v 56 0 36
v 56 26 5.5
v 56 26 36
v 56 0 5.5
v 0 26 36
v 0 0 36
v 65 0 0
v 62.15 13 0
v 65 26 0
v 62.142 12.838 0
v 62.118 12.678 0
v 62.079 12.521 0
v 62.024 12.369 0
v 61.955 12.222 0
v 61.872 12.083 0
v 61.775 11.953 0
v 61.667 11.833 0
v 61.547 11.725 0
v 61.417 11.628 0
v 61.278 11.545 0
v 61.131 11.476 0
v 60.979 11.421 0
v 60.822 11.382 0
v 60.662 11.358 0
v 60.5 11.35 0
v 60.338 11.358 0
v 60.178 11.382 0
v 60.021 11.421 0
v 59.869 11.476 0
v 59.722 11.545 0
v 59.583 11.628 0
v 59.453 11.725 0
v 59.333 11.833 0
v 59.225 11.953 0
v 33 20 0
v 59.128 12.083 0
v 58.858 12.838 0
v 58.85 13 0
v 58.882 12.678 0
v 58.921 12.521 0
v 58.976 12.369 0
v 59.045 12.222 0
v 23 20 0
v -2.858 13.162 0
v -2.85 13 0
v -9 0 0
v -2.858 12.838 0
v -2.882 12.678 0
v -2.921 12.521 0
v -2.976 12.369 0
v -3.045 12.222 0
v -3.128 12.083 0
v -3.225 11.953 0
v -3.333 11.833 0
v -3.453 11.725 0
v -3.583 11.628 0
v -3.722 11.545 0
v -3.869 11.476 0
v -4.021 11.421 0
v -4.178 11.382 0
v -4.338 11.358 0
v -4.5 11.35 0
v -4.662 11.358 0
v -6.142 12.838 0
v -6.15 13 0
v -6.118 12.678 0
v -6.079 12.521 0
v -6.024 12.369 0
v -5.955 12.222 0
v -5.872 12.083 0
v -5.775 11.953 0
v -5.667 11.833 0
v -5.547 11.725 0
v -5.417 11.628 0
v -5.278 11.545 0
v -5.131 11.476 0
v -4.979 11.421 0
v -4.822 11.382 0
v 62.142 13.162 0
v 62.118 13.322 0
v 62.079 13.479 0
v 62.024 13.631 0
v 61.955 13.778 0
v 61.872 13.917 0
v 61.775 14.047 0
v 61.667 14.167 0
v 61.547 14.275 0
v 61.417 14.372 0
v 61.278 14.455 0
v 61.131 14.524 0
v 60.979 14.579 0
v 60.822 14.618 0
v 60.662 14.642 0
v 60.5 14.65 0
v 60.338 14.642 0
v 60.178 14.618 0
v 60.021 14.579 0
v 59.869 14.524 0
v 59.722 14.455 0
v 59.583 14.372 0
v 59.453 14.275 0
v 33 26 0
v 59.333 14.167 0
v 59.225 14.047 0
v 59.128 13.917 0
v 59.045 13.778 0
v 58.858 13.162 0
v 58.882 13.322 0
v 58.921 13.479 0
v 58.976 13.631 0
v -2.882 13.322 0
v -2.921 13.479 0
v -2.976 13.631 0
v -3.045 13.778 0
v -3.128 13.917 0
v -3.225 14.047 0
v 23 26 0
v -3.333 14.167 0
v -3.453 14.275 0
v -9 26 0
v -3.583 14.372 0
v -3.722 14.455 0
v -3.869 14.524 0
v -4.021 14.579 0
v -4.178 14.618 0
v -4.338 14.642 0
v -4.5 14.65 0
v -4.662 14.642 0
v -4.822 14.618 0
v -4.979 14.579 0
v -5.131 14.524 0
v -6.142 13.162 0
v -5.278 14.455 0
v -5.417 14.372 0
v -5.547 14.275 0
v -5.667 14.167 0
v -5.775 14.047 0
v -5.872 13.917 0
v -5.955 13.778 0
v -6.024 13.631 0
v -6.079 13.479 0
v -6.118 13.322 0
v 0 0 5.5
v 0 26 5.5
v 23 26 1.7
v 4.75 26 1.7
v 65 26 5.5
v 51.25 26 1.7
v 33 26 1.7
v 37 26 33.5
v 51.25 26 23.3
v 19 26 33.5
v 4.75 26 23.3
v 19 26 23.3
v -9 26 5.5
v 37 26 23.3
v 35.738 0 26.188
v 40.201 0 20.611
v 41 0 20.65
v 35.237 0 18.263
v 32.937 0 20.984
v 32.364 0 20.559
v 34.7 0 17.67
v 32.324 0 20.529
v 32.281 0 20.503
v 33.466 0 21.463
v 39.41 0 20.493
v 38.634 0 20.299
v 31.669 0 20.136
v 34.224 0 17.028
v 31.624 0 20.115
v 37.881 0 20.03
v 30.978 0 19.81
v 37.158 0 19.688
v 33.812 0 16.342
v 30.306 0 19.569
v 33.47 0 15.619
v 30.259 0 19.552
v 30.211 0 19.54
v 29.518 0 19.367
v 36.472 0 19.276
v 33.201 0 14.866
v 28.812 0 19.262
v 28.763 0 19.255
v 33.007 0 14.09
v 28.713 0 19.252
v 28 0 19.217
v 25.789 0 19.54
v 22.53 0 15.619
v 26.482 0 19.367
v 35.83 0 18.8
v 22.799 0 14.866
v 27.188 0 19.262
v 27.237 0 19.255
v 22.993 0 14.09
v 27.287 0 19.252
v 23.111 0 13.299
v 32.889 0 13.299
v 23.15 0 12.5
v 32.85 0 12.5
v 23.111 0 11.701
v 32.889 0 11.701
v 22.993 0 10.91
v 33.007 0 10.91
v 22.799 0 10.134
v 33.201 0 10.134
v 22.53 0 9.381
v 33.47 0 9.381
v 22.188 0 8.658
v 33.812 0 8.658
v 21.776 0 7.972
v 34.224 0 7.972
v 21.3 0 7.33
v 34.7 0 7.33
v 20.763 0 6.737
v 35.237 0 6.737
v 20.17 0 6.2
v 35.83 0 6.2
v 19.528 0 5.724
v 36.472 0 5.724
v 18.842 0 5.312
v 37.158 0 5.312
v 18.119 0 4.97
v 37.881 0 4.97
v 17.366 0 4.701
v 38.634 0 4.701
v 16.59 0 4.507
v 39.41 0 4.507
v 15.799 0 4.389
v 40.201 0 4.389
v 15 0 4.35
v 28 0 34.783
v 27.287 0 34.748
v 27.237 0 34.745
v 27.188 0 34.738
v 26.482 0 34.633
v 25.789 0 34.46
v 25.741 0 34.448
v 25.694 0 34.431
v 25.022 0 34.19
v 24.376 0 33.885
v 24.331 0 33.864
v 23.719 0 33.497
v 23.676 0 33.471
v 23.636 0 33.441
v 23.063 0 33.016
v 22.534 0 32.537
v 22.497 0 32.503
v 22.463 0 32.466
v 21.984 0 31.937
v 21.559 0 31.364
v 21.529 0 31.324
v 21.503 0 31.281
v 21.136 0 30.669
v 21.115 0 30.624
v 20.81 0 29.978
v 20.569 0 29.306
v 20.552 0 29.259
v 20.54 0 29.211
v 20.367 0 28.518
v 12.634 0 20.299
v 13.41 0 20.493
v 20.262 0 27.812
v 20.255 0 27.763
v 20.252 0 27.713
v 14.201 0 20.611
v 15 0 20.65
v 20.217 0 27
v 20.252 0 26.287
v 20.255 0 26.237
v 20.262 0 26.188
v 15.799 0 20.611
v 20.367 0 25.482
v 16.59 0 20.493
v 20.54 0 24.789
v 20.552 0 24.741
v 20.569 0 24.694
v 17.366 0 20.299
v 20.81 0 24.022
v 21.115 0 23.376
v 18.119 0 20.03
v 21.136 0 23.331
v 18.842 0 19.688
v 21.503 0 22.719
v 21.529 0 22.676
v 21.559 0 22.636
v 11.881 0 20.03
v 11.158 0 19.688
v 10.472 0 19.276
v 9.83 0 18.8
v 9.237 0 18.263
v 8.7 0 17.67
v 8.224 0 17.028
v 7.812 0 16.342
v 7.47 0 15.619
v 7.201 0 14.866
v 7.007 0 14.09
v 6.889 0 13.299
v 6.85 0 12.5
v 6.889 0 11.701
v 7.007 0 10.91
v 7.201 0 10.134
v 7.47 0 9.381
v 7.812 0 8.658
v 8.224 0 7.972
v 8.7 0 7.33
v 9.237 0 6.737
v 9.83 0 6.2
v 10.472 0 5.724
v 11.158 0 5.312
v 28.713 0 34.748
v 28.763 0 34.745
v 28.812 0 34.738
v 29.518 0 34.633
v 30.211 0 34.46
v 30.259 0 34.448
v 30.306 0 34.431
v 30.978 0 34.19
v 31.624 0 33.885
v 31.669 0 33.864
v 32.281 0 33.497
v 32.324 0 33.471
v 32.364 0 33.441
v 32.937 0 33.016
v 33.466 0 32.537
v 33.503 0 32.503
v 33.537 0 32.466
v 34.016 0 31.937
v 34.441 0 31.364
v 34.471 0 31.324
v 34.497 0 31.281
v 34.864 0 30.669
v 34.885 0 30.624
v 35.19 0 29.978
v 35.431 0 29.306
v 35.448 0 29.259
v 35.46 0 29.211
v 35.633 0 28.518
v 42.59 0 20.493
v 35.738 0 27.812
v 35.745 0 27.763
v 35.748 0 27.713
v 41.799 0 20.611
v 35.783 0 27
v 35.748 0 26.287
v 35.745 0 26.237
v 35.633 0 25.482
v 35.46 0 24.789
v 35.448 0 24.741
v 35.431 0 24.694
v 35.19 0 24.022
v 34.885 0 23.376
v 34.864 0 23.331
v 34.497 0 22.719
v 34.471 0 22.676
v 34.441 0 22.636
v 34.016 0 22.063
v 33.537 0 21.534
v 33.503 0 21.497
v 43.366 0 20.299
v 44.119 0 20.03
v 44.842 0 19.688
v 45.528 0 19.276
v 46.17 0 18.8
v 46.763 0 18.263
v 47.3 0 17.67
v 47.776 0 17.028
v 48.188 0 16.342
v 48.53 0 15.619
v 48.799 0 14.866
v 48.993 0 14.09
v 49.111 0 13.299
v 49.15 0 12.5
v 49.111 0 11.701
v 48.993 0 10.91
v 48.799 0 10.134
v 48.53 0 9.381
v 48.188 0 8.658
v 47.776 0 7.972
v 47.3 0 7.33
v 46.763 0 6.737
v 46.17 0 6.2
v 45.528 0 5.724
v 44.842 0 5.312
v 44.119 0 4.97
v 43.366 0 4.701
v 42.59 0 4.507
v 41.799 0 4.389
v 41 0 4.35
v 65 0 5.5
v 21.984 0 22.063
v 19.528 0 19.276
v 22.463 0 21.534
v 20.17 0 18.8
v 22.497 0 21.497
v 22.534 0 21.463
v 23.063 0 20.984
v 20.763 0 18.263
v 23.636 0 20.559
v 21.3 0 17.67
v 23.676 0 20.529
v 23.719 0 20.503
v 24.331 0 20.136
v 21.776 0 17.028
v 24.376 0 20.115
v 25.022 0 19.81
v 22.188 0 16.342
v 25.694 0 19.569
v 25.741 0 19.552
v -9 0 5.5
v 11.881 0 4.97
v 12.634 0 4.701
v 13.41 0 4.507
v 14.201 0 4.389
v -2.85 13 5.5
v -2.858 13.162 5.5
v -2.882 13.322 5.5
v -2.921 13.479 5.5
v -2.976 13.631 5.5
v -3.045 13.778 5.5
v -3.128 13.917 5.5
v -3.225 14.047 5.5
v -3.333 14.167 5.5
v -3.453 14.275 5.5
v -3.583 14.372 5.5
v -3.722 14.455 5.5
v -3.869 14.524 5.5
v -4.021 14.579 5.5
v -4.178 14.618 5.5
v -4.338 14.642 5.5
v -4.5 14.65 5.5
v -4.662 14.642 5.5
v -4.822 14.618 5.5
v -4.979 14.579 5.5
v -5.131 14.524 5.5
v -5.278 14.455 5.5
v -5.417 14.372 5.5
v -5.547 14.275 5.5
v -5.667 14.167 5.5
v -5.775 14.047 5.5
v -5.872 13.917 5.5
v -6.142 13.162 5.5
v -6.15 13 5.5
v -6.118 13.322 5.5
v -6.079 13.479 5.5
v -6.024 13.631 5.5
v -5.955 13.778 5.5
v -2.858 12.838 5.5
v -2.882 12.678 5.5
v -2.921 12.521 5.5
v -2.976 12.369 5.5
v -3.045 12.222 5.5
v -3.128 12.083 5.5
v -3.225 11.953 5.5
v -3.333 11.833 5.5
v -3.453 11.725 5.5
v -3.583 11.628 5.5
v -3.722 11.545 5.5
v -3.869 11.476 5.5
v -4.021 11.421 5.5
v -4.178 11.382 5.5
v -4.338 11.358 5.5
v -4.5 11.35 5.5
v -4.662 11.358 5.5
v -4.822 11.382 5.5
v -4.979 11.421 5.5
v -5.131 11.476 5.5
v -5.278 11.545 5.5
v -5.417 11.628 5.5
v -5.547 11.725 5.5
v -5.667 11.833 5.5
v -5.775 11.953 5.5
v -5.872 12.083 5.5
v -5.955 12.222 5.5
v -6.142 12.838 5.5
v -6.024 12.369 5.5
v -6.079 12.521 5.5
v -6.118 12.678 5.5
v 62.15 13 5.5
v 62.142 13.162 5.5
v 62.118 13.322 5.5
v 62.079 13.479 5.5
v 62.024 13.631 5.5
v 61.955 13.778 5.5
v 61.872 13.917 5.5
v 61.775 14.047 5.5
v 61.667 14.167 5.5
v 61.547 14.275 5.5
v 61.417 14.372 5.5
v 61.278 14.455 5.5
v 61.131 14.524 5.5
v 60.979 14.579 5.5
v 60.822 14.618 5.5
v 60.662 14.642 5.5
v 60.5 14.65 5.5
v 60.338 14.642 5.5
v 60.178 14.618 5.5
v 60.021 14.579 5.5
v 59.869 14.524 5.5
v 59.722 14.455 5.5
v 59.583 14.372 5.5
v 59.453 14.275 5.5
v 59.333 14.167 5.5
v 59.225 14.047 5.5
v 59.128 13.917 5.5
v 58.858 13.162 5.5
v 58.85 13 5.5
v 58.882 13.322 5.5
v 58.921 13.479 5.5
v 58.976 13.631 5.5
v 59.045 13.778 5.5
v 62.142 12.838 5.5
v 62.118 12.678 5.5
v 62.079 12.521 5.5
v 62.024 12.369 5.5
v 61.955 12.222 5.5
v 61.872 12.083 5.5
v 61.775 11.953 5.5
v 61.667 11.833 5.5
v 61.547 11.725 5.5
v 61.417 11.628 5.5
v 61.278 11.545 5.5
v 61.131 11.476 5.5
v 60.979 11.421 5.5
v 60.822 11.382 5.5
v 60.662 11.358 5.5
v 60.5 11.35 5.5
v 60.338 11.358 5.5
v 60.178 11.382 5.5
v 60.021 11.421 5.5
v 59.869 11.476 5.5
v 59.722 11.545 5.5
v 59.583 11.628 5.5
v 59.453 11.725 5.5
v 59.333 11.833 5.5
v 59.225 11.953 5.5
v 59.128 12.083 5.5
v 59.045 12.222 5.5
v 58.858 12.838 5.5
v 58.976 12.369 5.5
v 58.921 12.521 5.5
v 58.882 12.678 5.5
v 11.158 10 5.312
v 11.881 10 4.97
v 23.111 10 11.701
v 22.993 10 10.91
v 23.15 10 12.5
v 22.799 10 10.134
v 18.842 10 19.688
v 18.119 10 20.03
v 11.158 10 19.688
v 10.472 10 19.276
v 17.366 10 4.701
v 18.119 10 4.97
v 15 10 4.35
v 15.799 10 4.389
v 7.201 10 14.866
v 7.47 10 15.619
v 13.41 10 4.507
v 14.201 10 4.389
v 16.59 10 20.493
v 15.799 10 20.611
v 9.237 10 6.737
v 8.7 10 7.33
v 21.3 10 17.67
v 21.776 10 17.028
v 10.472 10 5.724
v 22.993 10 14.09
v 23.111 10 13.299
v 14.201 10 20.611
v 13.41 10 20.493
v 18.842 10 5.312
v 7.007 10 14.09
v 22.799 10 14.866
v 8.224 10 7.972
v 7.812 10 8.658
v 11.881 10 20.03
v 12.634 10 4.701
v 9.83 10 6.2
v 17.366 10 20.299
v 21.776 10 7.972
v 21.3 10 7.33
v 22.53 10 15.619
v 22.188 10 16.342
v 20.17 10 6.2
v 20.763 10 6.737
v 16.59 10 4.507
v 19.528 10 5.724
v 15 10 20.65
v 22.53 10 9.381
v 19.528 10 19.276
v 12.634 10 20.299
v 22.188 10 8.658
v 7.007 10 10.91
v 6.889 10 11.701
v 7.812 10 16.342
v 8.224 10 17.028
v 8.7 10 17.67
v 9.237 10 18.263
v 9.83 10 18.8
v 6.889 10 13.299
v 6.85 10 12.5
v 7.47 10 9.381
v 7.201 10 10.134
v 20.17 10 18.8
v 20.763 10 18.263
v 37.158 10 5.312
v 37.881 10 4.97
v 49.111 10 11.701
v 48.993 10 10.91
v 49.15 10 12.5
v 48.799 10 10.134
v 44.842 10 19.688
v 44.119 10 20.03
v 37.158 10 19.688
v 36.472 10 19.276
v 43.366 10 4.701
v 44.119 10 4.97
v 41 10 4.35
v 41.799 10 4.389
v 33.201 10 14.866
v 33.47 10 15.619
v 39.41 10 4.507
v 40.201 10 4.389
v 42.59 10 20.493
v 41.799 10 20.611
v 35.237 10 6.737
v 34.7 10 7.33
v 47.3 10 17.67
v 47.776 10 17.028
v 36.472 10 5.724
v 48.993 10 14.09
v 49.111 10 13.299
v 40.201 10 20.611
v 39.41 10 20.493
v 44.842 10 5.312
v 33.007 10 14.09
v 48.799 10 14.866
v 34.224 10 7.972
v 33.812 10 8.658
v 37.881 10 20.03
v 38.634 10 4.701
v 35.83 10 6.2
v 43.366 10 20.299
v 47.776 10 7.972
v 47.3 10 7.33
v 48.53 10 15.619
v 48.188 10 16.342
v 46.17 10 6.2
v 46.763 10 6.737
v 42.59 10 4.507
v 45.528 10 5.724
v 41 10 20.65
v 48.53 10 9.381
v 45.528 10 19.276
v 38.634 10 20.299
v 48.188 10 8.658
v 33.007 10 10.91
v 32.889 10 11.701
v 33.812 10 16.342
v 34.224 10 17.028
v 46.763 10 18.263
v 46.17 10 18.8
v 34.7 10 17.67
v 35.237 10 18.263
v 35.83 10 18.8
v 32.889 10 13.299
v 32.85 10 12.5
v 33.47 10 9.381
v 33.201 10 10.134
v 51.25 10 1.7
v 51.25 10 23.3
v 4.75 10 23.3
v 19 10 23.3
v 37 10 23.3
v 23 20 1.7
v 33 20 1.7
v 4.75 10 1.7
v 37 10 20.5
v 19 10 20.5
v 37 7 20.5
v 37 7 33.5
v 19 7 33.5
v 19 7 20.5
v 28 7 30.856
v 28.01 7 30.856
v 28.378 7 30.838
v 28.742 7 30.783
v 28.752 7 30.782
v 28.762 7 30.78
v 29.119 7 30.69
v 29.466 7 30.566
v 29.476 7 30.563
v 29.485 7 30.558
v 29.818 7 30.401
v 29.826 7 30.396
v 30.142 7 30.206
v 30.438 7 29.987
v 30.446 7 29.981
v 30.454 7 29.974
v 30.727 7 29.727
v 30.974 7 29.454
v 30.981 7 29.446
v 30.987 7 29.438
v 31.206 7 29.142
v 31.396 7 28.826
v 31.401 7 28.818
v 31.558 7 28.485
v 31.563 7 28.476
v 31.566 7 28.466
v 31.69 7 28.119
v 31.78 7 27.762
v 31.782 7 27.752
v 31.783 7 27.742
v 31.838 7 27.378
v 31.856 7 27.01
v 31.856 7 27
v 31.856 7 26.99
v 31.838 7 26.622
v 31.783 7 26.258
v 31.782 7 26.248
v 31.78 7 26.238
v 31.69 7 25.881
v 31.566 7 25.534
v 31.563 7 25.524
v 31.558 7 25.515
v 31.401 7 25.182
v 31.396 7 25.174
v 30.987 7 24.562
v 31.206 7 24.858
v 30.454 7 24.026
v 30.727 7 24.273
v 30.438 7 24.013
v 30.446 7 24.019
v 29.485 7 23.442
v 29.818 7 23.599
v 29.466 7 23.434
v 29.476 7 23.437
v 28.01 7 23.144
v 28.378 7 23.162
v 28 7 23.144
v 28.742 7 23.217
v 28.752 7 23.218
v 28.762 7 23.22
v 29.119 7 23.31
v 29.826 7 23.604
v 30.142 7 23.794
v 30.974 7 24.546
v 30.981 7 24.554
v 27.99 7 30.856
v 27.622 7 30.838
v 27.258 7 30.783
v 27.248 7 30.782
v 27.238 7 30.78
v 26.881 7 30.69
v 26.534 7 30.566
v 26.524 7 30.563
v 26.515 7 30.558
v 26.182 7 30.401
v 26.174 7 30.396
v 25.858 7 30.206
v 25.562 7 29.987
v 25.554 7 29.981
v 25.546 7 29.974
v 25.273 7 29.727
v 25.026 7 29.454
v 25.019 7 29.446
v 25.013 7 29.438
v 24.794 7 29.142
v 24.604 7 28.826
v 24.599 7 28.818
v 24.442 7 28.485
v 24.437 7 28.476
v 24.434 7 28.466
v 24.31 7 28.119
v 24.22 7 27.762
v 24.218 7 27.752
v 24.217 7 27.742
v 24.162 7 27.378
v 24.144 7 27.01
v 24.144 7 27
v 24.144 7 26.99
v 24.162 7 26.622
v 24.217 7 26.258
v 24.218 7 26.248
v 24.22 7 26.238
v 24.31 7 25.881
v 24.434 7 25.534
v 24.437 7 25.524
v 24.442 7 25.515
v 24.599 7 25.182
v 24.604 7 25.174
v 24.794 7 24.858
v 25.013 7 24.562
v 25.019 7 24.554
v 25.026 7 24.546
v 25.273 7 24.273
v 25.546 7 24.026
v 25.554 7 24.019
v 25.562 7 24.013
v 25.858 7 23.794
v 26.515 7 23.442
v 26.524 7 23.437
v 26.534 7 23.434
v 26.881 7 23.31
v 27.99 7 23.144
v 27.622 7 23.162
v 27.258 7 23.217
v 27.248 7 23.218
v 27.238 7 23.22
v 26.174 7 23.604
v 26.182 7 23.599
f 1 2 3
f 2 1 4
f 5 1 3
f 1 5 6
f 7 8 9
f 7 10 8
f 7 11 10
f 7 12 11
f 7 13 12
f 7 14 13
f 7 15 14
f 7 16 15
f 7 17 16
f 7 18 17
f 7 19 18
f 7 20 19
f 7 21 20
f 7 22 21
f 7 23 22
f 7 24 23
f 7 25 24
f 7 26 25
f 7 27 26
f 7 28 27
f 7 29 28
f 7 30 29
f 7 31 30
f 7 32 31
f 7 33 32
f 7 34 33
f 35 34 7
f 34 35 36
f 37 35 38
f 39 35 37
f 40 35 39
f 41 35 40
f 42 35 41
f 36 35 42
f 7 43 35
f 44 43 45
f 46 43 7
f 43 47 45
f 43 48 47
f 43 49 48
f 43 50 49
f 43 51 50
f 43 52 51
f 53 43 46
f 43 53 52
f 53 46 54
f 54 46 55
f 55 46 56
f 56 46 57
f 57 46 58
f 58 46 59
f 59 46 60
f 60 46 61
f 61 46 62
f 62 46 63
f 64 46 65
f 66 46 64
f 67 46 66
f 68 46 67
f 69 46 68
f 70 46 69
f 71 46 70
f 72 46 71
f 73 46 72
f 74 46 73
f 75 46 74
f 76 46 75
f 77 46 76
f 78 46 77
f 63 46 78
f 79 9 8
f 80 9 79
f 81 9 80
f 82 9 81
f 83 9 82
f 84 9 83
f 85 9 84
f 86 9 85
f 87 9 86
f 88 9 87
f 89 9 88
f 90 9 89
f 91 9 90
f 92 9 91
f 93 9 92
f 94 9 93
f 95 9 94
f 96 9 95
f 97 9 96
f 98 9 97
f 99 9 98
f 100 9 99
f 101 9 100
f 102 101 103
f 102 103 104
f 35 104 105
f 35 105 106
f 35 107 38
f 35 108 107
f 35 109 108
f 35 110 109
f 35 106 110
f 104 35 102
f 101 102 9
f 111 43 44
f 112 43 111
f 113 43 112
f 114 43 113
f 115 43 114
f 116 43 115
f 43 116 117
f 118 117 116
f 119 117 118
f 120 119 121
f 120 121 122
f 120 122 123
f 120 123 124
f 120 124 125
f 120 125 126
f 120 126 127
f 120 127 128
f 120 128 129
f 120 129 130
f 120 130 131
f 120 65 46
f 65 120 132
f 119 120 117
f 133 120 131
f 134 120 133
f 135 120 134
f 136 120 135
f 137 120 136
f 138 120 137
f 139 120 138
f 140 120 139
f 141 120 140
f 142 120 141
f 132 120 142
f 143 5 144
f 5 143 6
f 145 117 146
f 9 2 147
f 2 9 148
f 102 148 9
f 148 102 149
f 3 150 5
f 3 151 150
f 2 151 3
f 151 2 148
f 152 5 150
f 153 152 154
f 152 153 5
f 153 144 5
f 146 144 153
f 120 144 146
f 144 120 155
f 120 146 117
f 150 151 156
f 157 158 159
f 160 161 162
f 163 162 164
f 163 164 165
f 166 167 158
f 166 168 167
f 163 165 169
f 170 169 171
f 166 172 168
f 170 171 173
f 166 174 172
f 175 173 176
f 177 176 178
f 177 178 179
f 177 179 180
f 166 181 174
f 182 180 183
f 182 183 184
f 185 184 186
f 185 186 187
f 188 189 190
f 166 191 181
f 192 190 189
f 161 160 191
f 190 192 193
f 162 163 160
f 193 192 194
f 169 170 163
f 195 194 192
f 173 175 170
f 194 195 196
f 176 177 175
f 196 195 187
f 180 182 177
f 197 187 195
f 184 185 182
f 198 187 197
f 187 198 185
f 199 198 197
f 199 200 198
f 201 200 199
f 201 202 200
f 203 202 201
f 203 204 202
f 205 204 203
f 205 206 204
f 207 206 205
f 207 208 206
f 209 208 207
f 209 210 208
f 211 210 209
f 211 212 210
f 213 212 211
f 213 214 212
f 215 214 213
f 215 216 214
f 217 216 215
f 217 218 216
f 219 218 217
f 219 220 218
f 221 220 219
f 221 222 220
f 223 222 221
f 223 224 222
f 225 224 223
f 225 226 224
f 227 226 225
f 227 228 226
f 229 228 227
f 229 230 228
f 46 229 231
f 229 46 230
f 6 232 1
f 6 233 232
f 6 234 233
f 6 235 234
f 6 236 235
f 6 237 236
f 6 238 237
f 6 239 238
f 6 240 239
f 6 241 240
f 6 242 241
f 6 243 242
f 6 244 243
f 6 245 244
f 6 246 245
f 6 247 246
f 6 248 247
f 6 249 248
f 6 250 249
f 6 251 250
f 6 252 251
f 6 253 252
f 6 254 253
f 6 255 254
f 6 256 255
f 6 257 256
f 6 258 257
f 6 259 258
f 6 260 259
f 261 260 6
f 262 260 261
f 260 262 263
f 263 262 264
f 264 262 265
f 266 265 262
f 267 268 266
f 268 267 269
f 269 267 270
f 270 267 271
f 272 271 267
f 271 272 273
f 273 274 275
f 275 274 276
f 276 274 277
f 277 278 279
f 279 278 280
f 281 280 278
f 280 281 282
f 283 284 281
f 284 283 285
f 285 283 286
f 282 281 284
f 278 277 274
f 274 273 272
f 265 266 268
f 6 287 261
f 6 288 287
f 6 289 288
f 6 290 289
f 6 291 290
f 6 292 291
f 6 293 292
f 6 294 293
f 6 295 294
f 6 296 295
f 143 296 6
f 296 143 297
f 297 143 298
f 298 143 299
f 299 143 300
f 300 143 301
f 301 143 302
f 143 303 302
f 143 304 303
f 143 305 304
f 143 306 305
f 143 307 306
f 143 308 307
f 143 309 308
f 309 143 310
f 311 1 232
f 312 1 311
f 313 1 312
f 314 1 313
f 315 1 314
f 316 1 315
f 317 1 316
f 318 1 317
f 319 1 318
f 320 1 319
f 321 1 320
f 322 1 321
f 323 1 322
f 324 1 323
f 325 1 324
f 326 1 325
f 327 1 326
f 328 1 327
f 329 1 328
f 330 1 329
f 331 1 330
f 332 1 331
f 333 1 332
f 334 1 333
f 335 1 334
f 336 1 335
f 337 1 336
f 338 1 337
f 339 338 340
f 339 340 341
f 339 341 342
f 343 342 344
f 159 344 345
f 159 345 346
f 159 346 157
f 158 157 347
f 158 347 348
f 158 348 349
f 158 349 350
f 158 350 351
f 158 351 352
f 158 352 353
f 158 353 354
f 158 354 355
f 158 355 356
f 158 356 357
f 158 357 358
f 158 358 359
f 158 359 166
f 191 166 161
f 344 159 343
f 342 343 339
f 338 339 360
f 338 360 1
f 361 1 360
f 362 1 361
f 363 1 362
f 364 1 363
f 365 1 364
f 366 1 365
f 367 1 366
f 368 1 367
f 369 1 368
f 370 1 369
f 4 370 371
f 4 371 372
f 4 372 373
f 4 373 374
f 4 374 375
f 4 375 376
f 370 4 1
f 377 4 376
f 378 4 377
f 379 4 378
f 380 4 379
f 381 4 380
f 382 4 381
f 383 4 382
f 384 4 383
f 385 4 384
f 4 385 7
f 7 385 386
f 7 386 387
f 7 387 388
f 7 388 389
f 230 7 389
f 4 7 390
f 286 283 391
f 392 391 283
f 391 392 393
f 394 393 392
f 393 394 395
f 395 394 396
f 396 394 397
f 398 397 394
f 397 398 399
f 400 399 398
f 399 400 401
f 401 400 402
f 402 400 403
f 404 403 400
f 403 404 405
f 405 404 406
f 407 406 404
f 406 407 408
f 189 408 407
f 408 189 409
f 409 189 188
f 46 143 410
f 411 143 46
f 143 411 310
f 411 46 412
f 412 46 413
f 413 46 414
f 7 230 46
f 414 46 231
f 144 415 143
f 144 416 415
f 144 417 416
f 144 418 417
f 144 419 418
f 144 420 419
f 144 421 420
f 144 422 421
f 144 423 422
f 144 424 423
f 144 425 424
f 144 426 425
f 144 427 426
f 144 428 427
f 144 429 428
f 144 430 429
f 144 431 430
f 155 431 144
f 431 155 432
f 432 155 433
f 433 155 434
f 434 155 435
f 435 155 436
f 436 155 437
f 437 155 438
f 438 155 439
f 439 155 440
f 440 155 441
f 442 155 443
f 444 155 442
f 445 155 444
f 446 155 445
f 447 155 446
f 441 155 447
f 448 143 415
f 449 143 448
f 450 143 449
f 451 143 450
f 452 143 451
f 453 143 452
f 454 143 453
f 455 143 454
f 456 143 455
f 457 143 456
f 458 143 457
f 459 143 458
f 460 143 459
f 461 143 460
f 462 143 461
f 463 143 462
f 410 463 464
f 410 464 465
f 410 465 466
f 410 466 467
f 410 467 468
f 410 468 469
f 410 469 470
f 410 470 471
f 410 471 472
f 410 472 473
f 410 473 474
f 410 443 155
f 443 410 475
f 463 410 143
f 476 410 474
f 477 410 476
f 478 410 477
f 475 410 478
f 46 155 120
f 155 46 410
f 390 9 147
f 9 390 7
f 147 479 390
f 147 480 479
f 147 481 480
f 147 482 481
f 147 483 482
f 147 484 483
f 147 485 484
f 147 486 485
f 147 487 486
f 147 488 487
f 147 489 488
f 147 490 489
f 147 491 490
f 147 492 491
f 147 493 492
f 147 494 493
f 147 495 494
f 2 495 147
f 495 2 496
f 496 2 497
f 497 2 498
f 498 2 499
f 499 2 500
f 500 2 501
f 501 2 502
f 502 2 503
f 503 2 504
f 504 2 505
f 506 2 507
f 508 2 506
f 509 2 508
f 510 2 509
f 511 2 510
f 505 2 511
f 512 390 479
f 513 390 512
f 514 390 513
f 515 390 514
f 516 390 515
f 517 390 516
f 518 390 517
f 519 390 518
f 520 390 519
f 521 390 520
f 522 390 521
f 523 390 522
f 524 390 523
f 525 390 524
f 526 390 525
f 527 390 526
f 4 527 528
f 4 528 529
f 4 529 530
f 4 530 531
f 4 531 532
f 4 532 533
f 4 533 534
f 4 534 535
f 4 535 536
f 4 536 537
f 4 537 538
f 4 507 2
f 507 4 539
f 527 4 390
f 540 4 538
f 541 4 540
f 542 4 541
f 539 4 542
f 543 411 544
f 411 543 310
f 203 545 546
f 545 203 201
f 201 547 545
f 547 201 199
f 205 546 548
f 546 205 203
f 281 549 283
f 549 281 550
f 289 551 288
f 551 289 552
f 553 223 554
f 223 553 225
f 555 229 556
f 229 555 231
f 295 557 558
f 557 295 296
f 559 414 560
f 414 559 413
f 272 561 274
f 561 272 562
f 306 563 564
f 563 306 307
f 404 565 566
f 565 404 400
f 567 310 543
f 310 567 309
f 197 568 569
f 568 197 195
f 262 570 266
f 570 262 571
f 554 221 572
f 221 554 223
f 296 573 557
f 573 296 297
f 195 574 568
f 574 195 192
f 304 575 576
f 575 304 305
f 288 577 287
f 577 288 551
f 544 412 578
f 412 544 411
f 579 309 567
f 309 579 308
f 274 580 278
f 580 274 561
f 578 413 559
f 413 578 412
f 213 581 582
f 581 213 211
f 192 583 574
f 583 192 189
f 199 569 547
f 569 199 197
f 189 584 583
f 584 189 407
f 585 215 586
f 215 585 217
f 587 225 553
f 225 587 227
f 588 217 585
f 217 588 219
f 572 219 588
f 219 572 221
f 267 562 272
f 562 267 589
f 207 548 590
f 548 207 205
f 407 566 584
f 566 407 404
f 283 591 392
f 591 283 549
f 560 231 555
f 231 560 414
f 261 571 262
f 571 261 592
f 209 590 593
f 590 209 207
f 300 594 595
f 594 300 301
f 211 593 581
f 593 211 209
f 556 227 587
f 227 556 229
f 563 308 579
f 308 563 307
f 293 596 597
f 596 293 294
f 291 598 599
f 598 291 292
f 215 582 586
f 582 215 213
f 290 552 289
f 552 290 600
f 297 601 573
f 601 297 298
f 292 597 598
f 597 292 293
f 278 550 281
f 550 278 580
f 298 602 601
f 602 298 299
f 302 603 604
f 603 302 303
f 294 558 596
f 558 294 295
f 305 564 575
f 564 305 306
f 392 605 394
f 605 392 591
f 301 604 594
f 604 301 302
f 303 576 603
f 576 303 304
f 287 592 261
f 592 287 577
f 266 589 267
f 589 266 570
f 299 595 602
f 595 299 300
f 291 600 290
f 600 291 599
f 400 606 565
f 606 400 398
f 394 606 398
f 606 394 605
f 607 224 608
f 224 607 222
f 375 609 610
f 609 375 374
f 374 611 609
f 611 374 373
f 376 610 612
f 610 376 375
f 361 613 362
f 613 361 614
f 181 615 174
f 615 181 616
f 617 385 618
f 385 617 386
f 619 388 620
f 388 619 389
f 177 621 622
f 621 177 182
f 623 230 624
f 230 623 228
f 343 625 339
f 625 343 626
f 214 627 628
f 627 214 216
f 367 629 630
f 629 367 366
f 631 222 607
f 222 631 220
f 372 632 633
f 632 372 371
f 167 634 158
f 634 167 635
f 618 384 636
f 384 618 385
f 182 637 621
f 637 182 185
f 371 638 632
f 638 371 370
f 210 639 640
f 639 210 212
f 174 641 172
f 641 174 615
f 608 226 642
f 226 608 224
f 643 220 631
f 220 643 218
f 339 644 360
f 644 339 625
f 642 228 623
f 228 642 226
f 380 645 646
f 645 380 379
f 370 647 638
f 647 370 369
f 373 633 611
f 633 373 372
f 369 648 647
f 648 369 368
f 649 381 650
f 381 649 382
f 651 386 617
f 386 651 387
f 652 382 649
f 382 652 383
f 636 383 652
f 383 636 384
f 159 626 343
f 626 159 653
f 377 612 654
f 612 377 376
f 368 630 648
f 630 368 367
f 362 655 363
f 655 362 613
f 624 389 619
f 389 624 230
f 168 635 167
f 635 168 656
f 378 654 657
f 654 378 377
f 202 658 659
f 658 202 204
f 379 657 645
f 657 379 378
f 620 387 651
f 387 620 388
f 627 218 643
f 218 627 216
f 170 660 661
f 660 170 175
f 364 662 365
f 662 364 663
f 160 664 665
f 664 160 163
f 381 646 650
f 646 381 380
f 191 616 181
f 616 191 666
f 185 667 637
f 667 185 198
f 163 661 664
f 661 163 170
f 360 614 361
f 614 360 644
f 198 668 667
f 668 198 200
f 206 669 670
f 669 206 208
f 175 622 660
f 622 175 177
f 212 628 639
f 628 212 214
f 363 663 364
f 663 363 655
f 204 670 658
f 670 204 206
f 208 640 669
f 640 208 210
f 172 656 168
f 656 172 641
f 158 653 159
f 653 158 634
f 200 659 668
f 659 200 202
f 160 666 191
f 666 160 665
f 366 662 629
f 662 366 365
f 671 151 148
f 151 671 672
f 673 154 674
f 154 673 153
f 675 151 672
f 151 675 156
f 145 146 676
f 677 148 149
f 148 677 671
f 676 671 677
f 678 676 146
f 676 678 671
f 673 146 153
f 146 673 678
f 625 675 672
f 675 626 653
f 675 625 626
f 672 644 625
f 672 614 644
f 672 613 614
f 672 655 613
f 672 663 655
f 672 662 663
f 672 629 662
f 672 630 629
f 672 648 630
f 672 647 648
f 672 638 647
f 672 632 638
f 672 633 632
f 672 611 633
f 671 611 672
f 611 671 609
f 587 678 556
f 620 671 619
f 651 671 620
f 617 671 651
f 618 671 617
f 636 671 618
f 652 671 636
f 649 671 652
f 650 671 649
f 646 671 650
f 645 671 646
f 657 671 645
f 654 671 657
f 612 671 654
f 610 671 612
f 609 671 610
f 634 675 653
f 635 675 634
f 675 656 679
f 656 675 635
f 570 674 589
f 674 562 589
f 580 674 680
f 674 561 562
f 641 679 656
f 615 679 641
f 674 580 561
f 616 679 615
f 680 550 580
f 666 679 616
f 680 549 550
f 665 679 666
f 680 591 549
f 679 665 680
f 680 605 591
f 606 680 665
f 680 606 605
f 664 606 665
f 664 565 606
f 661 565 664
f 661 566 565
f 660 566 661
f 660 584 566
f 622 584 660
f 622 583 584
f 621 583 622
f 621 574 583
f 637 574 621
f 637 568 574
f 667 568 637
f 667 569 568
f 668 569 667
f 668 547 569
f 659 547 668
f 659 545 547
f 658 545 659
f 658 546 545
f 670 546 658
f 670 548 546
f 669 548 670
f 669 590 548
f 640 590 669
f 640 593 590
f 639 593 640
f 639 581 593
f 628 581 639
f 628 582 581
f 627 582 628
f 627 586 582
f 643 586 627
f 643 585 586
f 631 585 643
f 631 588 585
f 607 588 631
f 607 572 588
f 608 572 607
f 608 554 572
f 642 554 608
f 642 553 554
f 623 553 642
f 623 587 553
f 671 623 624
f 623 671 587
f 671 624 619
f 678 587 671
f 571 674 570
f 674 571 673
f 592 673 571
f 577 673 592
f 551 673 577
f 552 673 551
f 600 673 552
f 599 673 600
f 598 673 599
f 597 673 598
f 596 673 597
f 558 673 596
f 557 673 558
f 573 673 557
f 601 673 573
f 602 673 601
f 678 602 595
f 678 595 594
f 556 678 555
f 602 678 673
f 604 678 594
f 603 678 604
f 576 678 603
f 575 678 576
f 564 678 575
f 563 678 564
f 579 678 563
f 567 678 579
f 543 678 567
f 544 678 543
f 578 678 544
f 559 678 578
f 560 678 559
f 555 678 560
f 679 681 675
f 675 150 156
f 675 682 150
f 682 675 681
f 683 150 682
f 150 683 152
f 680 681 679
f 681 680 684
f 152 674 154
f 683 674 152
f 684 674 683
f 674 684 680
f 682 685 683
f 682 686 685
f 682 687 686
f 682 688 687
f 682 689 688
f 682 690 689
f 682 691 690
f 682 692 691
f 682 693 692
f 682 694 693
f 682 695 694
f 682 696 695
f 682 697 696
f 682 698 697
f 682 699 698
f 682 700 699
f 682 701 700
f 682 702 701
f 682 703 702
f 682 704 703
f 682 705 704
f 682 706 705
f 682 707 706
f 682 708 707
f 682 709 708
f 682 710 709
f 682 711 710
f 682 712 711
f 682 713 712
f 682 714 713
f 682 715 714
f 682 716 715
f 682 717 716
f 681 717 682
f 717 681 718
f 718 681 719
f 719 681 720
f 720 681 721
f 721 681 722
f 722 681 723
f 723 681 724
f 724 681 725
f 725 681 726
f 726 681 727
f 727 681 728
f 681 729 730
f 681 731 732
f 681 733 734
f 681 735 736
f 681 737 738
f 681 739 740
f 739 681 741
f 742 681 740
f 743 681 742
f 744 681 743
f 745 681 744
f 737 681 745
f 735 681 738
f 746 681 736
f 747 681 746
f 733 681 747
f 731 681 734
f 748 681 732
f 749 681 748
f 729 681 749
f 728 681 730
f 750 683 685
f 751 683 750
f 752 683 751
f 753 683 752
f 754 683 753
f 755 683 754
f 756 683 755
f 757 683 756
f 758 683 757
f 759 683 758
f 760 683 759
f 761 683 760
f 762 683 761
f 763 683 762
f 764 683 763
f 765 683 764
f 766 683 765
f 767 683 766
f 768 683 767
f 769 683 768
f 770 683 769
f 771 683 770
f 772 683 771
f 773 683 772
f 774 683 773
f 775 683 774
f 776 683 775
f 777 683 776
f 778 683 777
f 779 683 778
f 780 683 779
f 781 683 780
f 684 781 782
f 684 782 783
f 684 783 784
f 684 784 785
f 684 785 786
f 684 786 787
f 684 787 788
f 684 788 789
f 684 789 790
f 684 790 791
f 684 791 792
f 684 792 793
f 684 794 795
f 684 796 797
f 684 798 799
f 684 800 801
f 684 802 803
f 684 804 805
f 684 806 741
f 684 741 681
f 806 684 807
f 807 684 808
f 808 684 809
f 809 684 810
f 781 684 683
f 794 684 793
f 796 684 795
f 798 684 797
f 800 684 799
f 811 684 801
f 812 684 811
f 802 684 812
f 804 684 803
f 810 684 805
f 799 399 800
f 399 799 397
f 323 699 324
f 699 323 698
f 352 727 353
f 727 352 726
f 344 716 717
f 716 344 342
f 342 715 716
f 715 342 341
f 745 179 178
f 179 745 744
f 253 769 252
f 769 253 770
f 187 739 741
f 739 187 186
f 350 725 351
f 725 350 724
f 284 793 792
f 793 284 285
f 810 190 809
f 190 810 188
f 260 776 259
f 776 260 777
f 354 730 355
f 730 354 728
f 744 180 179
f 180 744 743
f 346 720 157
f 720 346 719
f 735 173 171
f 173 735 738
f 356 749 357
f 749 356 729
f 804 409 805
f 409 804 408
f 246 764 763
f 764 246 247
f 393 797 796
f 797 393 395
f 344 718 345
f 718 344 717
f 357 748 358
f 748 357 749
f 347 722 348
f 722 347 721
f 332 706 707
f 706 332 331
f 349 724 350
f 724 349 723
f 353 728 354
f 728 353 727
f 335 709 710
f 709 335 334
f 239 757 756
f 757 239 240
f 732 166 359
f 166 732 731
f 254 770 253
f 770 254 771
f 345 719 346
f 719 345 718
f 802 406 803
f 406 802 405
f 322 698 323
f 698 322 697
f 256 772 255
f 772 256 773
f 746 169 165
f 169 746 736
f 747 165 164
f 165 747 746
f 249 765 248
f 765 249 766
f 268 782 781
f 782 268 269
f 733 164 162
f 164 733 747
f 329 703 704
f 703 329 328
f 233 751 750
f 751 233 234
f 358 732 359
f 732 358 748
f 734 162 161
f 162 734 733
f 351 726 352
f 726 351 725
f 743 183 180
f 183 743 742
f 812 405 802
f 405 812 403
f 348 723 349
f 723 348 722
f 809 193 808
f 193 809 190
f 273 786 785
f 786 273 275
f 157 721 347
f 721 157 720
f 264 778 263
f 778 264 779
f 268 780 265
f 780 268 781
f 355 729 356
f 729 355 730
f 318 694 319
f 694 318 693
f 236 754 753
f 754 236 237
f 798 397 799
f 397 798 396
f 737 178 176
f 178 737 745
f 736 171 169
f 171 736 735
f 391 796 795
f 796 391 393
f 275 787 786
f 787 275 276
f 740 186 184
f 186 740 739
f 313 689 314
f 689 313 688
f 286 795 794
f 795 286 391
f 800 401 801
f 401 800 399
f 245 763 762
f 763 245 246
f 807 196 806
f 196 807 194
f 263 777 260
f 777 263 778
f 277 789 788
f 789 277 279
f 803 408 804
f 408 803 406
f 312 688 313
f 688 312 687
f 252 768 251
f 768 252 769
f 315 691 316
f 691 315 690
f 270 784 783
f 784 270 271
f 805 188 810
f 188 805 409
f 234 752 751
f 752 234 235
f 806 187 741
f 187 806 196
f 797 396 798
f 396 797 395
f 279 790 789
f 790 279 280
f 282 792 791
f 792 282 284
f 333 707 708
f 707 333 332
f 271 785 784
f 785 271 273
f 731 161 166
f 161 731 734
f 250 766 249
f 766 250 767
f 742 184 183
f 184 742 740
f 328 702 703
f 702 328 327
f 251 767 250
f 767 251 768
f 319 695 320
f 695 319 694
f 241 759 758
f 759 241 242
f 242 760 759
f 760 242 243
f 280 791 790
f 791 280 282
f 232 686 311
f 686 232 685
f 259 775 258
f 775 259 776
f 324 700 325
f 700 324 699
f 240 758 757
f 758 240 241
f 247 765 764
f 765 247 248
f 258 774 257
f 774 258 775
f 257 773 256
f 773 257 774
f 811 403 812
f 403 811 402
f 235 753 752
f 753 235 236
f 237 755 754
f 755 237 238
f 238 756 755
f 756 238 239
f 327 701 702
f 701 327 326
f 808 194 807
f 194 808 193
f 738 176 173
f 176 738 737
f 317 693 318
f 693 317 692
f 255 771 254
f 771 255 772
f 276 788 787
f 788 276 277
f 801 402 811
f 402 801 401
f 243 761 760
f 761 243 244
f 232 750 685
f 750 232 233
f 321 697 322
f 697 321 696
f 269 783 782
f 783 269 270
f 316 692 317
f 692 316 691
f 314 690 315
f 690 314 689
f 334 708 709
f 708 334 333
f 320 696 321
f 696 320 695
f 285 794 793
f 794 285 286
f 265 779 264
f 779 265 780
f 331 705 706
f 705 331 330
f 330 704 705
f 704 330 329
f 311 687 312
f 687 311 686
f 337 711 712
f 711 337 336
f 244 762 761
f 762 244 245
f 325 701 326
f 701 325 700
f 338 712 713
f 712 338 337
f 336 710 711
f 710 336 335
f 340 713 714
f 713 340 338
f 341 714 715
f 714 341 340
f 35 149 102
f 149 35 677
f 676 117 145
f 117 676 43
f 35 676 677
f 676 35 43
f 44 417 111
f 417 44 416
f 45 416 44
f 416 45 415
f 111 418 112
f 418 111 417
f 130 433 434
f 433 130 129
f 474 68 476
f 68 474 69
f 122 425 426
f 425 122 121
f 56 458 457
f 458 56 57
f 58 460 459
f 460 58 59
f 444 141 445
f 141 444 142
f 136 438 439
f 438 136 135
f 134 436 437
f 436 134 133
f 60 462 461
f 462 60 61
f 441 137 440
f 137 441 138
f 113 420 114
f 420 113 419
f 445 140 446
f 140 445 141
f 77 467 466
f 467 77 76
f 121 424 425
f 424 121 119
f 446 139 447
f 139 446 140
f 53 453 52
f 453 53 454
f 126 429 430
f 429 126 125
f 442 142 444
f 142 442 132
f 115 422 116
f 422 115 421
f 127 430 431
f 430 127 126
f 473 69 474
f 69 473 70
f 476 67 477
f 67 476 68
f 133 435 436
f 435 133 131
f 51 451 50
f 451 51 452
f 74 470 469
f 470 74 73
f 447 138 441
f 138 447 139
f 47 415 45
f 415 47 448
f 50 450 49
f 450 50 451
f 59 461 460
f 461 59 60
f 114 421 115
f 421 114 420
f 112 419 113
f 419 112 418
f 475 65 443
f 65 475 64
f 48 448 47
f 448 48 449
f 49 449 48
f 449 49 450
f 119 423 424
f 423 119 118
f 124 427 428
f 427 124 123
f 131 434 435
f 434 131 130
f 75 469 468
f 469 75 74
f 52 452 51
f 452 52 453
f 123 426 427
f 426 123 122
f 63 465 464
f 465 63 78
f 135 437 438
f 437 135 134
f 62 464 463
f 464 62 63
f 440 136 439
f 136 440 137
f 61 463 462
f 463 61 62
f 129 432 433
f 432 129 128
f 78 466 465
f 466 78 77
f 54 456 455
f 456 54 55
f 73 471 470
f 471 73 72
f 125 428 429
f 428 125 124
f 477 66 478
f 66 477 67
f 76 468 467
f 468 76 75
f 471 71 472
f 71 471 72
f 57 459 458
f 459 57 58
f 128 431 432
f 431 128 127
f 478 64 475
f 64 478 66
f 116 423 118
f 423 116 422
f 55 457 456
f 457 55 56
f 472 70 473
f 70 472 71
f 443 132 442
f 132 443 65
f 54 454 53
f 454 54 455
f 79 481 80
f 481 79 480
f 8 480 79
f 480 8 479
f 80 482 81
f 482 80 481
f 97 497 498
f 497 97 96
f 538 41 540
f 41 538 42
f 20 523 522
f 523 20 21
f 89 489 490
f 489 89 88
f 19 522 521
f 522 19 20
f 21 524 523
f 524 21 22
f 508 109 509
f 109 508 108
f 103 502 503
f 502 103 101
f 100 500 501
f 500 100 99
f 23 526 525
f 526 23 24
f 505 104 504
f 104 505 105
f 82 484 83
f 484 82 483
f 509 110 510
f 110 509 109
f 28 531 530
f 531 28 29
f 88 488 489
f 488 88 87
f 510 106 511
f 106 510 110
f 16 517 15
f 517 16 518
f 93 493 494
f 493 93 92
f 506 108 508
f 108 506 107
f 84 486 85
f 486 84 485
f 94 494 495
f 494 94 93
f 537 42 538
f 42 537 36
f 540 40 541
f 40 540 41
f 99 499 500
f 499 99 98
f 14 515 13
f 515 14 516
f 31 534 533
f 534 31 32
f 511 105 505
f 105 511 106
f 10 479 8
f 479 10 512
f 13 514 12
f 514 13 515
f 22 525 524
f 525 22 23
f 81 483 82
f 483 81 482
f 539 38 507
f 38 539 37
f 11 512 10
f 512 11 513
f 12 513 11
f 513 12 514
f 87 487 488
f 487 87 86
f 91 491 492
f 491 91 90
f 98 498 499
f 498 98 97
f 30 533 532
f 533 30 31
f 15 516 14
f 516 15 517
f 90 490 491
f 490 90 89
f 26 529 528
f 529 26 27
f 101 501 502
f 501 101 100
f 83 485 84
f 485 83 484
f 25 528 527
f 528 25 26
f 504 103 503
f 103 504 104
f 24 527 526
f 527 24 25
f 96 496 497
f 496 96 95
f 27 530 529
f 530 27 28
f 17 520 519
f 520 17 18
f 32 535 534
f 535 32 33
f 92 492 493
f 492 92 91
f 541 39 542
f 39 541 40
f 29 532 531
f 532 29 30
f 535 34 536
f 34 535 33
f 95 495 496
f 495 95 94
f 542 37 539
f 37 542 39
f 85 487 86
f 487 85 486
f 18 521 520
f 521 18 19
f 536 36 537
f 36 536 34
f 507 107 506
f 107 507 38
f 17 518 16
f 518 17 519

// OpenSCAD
// cad/painel_sensores.scad — AEGIS-MECH v3.0 (Imprimivel Sem Colisoes, Parede=6.85mm)
$fn = 64;

bloco_w = 56.0;    // Corrige ruptura anterior (45.6 > 45.0): parede lateral = 6.85 mm!
bloco_d = 26.0;
bloco_h = 36.0;
us_dist = 26.0;    // Espacamento oficial centro-a-centro do HC-SR04 (igual arena_base)
us_r    = 8.15;    // Diametro 16.0 mm + folga 0.30 mm FDM
us_z    = 12.5;
tof_z   = 27.0;
x_c1    = (bloco_w - us_dist) / 2; // 15.0 mm
x_c2    = x_c1 + us_dist;          // 41.0 mm

module painel_sensores_v3() {
    difference() {
        union() {
            cube([bloco_w, bloco_d, bloco_h]);
            translate([-9, 0, 0])      cube([9, bloco_d, 5.5]);
            translate([bloco_w, 0, 0]) cube([9, bloco_d, 5.5]);
        }
        // 1. Par HC-SR04
        translate([x_c1, -1, us_z]) rotate([-90, 0, 0]) cylinder(r = us_r, h = bloco_d + 2);
        translate([x_c2, -1, us_z]) rotate([-90, 0, 0]) cylinder(r = us_r, h = bloco_d + 2);
        translate([(bloco_w - 46.5)/2, 10.0, us_z - 10.8])
            cube([46.5, bloco_d, 21.6]);

        // 2. Cavidade VL53L1X + abertura conica livre > 27 deg FOV anti-crosstalk IR 940nm
        translate([(bloco_w - 18.0)/2, 7.0, tof_z - 6.5])
            cube([18.0, bloco_d, 13.0]);
        translate([bloco_w/2, 7.1, tof_z])
            rotate([90, 0, 0])
                cylinder(r1 = 3.8, r2 = 8.4, h = 8.2);

        // 3. Passagem traseira p/ chicote 26AWG e furos M3 nas abas
        translate([(bloco_w - 10.0)/2, bloco_d - 6.0, -1]) cube([10.0, 7.0, 8.0]);
        translate([-4.5, bloco_d/2, -1])        cylinder(r = 1.65, h = 8.0);
        translate([bloco_w + 4.5, bloco_d/2, -1]) cylinder(r = 1.65, h = 8.0);
    }
}

painel_sensores_v3();
